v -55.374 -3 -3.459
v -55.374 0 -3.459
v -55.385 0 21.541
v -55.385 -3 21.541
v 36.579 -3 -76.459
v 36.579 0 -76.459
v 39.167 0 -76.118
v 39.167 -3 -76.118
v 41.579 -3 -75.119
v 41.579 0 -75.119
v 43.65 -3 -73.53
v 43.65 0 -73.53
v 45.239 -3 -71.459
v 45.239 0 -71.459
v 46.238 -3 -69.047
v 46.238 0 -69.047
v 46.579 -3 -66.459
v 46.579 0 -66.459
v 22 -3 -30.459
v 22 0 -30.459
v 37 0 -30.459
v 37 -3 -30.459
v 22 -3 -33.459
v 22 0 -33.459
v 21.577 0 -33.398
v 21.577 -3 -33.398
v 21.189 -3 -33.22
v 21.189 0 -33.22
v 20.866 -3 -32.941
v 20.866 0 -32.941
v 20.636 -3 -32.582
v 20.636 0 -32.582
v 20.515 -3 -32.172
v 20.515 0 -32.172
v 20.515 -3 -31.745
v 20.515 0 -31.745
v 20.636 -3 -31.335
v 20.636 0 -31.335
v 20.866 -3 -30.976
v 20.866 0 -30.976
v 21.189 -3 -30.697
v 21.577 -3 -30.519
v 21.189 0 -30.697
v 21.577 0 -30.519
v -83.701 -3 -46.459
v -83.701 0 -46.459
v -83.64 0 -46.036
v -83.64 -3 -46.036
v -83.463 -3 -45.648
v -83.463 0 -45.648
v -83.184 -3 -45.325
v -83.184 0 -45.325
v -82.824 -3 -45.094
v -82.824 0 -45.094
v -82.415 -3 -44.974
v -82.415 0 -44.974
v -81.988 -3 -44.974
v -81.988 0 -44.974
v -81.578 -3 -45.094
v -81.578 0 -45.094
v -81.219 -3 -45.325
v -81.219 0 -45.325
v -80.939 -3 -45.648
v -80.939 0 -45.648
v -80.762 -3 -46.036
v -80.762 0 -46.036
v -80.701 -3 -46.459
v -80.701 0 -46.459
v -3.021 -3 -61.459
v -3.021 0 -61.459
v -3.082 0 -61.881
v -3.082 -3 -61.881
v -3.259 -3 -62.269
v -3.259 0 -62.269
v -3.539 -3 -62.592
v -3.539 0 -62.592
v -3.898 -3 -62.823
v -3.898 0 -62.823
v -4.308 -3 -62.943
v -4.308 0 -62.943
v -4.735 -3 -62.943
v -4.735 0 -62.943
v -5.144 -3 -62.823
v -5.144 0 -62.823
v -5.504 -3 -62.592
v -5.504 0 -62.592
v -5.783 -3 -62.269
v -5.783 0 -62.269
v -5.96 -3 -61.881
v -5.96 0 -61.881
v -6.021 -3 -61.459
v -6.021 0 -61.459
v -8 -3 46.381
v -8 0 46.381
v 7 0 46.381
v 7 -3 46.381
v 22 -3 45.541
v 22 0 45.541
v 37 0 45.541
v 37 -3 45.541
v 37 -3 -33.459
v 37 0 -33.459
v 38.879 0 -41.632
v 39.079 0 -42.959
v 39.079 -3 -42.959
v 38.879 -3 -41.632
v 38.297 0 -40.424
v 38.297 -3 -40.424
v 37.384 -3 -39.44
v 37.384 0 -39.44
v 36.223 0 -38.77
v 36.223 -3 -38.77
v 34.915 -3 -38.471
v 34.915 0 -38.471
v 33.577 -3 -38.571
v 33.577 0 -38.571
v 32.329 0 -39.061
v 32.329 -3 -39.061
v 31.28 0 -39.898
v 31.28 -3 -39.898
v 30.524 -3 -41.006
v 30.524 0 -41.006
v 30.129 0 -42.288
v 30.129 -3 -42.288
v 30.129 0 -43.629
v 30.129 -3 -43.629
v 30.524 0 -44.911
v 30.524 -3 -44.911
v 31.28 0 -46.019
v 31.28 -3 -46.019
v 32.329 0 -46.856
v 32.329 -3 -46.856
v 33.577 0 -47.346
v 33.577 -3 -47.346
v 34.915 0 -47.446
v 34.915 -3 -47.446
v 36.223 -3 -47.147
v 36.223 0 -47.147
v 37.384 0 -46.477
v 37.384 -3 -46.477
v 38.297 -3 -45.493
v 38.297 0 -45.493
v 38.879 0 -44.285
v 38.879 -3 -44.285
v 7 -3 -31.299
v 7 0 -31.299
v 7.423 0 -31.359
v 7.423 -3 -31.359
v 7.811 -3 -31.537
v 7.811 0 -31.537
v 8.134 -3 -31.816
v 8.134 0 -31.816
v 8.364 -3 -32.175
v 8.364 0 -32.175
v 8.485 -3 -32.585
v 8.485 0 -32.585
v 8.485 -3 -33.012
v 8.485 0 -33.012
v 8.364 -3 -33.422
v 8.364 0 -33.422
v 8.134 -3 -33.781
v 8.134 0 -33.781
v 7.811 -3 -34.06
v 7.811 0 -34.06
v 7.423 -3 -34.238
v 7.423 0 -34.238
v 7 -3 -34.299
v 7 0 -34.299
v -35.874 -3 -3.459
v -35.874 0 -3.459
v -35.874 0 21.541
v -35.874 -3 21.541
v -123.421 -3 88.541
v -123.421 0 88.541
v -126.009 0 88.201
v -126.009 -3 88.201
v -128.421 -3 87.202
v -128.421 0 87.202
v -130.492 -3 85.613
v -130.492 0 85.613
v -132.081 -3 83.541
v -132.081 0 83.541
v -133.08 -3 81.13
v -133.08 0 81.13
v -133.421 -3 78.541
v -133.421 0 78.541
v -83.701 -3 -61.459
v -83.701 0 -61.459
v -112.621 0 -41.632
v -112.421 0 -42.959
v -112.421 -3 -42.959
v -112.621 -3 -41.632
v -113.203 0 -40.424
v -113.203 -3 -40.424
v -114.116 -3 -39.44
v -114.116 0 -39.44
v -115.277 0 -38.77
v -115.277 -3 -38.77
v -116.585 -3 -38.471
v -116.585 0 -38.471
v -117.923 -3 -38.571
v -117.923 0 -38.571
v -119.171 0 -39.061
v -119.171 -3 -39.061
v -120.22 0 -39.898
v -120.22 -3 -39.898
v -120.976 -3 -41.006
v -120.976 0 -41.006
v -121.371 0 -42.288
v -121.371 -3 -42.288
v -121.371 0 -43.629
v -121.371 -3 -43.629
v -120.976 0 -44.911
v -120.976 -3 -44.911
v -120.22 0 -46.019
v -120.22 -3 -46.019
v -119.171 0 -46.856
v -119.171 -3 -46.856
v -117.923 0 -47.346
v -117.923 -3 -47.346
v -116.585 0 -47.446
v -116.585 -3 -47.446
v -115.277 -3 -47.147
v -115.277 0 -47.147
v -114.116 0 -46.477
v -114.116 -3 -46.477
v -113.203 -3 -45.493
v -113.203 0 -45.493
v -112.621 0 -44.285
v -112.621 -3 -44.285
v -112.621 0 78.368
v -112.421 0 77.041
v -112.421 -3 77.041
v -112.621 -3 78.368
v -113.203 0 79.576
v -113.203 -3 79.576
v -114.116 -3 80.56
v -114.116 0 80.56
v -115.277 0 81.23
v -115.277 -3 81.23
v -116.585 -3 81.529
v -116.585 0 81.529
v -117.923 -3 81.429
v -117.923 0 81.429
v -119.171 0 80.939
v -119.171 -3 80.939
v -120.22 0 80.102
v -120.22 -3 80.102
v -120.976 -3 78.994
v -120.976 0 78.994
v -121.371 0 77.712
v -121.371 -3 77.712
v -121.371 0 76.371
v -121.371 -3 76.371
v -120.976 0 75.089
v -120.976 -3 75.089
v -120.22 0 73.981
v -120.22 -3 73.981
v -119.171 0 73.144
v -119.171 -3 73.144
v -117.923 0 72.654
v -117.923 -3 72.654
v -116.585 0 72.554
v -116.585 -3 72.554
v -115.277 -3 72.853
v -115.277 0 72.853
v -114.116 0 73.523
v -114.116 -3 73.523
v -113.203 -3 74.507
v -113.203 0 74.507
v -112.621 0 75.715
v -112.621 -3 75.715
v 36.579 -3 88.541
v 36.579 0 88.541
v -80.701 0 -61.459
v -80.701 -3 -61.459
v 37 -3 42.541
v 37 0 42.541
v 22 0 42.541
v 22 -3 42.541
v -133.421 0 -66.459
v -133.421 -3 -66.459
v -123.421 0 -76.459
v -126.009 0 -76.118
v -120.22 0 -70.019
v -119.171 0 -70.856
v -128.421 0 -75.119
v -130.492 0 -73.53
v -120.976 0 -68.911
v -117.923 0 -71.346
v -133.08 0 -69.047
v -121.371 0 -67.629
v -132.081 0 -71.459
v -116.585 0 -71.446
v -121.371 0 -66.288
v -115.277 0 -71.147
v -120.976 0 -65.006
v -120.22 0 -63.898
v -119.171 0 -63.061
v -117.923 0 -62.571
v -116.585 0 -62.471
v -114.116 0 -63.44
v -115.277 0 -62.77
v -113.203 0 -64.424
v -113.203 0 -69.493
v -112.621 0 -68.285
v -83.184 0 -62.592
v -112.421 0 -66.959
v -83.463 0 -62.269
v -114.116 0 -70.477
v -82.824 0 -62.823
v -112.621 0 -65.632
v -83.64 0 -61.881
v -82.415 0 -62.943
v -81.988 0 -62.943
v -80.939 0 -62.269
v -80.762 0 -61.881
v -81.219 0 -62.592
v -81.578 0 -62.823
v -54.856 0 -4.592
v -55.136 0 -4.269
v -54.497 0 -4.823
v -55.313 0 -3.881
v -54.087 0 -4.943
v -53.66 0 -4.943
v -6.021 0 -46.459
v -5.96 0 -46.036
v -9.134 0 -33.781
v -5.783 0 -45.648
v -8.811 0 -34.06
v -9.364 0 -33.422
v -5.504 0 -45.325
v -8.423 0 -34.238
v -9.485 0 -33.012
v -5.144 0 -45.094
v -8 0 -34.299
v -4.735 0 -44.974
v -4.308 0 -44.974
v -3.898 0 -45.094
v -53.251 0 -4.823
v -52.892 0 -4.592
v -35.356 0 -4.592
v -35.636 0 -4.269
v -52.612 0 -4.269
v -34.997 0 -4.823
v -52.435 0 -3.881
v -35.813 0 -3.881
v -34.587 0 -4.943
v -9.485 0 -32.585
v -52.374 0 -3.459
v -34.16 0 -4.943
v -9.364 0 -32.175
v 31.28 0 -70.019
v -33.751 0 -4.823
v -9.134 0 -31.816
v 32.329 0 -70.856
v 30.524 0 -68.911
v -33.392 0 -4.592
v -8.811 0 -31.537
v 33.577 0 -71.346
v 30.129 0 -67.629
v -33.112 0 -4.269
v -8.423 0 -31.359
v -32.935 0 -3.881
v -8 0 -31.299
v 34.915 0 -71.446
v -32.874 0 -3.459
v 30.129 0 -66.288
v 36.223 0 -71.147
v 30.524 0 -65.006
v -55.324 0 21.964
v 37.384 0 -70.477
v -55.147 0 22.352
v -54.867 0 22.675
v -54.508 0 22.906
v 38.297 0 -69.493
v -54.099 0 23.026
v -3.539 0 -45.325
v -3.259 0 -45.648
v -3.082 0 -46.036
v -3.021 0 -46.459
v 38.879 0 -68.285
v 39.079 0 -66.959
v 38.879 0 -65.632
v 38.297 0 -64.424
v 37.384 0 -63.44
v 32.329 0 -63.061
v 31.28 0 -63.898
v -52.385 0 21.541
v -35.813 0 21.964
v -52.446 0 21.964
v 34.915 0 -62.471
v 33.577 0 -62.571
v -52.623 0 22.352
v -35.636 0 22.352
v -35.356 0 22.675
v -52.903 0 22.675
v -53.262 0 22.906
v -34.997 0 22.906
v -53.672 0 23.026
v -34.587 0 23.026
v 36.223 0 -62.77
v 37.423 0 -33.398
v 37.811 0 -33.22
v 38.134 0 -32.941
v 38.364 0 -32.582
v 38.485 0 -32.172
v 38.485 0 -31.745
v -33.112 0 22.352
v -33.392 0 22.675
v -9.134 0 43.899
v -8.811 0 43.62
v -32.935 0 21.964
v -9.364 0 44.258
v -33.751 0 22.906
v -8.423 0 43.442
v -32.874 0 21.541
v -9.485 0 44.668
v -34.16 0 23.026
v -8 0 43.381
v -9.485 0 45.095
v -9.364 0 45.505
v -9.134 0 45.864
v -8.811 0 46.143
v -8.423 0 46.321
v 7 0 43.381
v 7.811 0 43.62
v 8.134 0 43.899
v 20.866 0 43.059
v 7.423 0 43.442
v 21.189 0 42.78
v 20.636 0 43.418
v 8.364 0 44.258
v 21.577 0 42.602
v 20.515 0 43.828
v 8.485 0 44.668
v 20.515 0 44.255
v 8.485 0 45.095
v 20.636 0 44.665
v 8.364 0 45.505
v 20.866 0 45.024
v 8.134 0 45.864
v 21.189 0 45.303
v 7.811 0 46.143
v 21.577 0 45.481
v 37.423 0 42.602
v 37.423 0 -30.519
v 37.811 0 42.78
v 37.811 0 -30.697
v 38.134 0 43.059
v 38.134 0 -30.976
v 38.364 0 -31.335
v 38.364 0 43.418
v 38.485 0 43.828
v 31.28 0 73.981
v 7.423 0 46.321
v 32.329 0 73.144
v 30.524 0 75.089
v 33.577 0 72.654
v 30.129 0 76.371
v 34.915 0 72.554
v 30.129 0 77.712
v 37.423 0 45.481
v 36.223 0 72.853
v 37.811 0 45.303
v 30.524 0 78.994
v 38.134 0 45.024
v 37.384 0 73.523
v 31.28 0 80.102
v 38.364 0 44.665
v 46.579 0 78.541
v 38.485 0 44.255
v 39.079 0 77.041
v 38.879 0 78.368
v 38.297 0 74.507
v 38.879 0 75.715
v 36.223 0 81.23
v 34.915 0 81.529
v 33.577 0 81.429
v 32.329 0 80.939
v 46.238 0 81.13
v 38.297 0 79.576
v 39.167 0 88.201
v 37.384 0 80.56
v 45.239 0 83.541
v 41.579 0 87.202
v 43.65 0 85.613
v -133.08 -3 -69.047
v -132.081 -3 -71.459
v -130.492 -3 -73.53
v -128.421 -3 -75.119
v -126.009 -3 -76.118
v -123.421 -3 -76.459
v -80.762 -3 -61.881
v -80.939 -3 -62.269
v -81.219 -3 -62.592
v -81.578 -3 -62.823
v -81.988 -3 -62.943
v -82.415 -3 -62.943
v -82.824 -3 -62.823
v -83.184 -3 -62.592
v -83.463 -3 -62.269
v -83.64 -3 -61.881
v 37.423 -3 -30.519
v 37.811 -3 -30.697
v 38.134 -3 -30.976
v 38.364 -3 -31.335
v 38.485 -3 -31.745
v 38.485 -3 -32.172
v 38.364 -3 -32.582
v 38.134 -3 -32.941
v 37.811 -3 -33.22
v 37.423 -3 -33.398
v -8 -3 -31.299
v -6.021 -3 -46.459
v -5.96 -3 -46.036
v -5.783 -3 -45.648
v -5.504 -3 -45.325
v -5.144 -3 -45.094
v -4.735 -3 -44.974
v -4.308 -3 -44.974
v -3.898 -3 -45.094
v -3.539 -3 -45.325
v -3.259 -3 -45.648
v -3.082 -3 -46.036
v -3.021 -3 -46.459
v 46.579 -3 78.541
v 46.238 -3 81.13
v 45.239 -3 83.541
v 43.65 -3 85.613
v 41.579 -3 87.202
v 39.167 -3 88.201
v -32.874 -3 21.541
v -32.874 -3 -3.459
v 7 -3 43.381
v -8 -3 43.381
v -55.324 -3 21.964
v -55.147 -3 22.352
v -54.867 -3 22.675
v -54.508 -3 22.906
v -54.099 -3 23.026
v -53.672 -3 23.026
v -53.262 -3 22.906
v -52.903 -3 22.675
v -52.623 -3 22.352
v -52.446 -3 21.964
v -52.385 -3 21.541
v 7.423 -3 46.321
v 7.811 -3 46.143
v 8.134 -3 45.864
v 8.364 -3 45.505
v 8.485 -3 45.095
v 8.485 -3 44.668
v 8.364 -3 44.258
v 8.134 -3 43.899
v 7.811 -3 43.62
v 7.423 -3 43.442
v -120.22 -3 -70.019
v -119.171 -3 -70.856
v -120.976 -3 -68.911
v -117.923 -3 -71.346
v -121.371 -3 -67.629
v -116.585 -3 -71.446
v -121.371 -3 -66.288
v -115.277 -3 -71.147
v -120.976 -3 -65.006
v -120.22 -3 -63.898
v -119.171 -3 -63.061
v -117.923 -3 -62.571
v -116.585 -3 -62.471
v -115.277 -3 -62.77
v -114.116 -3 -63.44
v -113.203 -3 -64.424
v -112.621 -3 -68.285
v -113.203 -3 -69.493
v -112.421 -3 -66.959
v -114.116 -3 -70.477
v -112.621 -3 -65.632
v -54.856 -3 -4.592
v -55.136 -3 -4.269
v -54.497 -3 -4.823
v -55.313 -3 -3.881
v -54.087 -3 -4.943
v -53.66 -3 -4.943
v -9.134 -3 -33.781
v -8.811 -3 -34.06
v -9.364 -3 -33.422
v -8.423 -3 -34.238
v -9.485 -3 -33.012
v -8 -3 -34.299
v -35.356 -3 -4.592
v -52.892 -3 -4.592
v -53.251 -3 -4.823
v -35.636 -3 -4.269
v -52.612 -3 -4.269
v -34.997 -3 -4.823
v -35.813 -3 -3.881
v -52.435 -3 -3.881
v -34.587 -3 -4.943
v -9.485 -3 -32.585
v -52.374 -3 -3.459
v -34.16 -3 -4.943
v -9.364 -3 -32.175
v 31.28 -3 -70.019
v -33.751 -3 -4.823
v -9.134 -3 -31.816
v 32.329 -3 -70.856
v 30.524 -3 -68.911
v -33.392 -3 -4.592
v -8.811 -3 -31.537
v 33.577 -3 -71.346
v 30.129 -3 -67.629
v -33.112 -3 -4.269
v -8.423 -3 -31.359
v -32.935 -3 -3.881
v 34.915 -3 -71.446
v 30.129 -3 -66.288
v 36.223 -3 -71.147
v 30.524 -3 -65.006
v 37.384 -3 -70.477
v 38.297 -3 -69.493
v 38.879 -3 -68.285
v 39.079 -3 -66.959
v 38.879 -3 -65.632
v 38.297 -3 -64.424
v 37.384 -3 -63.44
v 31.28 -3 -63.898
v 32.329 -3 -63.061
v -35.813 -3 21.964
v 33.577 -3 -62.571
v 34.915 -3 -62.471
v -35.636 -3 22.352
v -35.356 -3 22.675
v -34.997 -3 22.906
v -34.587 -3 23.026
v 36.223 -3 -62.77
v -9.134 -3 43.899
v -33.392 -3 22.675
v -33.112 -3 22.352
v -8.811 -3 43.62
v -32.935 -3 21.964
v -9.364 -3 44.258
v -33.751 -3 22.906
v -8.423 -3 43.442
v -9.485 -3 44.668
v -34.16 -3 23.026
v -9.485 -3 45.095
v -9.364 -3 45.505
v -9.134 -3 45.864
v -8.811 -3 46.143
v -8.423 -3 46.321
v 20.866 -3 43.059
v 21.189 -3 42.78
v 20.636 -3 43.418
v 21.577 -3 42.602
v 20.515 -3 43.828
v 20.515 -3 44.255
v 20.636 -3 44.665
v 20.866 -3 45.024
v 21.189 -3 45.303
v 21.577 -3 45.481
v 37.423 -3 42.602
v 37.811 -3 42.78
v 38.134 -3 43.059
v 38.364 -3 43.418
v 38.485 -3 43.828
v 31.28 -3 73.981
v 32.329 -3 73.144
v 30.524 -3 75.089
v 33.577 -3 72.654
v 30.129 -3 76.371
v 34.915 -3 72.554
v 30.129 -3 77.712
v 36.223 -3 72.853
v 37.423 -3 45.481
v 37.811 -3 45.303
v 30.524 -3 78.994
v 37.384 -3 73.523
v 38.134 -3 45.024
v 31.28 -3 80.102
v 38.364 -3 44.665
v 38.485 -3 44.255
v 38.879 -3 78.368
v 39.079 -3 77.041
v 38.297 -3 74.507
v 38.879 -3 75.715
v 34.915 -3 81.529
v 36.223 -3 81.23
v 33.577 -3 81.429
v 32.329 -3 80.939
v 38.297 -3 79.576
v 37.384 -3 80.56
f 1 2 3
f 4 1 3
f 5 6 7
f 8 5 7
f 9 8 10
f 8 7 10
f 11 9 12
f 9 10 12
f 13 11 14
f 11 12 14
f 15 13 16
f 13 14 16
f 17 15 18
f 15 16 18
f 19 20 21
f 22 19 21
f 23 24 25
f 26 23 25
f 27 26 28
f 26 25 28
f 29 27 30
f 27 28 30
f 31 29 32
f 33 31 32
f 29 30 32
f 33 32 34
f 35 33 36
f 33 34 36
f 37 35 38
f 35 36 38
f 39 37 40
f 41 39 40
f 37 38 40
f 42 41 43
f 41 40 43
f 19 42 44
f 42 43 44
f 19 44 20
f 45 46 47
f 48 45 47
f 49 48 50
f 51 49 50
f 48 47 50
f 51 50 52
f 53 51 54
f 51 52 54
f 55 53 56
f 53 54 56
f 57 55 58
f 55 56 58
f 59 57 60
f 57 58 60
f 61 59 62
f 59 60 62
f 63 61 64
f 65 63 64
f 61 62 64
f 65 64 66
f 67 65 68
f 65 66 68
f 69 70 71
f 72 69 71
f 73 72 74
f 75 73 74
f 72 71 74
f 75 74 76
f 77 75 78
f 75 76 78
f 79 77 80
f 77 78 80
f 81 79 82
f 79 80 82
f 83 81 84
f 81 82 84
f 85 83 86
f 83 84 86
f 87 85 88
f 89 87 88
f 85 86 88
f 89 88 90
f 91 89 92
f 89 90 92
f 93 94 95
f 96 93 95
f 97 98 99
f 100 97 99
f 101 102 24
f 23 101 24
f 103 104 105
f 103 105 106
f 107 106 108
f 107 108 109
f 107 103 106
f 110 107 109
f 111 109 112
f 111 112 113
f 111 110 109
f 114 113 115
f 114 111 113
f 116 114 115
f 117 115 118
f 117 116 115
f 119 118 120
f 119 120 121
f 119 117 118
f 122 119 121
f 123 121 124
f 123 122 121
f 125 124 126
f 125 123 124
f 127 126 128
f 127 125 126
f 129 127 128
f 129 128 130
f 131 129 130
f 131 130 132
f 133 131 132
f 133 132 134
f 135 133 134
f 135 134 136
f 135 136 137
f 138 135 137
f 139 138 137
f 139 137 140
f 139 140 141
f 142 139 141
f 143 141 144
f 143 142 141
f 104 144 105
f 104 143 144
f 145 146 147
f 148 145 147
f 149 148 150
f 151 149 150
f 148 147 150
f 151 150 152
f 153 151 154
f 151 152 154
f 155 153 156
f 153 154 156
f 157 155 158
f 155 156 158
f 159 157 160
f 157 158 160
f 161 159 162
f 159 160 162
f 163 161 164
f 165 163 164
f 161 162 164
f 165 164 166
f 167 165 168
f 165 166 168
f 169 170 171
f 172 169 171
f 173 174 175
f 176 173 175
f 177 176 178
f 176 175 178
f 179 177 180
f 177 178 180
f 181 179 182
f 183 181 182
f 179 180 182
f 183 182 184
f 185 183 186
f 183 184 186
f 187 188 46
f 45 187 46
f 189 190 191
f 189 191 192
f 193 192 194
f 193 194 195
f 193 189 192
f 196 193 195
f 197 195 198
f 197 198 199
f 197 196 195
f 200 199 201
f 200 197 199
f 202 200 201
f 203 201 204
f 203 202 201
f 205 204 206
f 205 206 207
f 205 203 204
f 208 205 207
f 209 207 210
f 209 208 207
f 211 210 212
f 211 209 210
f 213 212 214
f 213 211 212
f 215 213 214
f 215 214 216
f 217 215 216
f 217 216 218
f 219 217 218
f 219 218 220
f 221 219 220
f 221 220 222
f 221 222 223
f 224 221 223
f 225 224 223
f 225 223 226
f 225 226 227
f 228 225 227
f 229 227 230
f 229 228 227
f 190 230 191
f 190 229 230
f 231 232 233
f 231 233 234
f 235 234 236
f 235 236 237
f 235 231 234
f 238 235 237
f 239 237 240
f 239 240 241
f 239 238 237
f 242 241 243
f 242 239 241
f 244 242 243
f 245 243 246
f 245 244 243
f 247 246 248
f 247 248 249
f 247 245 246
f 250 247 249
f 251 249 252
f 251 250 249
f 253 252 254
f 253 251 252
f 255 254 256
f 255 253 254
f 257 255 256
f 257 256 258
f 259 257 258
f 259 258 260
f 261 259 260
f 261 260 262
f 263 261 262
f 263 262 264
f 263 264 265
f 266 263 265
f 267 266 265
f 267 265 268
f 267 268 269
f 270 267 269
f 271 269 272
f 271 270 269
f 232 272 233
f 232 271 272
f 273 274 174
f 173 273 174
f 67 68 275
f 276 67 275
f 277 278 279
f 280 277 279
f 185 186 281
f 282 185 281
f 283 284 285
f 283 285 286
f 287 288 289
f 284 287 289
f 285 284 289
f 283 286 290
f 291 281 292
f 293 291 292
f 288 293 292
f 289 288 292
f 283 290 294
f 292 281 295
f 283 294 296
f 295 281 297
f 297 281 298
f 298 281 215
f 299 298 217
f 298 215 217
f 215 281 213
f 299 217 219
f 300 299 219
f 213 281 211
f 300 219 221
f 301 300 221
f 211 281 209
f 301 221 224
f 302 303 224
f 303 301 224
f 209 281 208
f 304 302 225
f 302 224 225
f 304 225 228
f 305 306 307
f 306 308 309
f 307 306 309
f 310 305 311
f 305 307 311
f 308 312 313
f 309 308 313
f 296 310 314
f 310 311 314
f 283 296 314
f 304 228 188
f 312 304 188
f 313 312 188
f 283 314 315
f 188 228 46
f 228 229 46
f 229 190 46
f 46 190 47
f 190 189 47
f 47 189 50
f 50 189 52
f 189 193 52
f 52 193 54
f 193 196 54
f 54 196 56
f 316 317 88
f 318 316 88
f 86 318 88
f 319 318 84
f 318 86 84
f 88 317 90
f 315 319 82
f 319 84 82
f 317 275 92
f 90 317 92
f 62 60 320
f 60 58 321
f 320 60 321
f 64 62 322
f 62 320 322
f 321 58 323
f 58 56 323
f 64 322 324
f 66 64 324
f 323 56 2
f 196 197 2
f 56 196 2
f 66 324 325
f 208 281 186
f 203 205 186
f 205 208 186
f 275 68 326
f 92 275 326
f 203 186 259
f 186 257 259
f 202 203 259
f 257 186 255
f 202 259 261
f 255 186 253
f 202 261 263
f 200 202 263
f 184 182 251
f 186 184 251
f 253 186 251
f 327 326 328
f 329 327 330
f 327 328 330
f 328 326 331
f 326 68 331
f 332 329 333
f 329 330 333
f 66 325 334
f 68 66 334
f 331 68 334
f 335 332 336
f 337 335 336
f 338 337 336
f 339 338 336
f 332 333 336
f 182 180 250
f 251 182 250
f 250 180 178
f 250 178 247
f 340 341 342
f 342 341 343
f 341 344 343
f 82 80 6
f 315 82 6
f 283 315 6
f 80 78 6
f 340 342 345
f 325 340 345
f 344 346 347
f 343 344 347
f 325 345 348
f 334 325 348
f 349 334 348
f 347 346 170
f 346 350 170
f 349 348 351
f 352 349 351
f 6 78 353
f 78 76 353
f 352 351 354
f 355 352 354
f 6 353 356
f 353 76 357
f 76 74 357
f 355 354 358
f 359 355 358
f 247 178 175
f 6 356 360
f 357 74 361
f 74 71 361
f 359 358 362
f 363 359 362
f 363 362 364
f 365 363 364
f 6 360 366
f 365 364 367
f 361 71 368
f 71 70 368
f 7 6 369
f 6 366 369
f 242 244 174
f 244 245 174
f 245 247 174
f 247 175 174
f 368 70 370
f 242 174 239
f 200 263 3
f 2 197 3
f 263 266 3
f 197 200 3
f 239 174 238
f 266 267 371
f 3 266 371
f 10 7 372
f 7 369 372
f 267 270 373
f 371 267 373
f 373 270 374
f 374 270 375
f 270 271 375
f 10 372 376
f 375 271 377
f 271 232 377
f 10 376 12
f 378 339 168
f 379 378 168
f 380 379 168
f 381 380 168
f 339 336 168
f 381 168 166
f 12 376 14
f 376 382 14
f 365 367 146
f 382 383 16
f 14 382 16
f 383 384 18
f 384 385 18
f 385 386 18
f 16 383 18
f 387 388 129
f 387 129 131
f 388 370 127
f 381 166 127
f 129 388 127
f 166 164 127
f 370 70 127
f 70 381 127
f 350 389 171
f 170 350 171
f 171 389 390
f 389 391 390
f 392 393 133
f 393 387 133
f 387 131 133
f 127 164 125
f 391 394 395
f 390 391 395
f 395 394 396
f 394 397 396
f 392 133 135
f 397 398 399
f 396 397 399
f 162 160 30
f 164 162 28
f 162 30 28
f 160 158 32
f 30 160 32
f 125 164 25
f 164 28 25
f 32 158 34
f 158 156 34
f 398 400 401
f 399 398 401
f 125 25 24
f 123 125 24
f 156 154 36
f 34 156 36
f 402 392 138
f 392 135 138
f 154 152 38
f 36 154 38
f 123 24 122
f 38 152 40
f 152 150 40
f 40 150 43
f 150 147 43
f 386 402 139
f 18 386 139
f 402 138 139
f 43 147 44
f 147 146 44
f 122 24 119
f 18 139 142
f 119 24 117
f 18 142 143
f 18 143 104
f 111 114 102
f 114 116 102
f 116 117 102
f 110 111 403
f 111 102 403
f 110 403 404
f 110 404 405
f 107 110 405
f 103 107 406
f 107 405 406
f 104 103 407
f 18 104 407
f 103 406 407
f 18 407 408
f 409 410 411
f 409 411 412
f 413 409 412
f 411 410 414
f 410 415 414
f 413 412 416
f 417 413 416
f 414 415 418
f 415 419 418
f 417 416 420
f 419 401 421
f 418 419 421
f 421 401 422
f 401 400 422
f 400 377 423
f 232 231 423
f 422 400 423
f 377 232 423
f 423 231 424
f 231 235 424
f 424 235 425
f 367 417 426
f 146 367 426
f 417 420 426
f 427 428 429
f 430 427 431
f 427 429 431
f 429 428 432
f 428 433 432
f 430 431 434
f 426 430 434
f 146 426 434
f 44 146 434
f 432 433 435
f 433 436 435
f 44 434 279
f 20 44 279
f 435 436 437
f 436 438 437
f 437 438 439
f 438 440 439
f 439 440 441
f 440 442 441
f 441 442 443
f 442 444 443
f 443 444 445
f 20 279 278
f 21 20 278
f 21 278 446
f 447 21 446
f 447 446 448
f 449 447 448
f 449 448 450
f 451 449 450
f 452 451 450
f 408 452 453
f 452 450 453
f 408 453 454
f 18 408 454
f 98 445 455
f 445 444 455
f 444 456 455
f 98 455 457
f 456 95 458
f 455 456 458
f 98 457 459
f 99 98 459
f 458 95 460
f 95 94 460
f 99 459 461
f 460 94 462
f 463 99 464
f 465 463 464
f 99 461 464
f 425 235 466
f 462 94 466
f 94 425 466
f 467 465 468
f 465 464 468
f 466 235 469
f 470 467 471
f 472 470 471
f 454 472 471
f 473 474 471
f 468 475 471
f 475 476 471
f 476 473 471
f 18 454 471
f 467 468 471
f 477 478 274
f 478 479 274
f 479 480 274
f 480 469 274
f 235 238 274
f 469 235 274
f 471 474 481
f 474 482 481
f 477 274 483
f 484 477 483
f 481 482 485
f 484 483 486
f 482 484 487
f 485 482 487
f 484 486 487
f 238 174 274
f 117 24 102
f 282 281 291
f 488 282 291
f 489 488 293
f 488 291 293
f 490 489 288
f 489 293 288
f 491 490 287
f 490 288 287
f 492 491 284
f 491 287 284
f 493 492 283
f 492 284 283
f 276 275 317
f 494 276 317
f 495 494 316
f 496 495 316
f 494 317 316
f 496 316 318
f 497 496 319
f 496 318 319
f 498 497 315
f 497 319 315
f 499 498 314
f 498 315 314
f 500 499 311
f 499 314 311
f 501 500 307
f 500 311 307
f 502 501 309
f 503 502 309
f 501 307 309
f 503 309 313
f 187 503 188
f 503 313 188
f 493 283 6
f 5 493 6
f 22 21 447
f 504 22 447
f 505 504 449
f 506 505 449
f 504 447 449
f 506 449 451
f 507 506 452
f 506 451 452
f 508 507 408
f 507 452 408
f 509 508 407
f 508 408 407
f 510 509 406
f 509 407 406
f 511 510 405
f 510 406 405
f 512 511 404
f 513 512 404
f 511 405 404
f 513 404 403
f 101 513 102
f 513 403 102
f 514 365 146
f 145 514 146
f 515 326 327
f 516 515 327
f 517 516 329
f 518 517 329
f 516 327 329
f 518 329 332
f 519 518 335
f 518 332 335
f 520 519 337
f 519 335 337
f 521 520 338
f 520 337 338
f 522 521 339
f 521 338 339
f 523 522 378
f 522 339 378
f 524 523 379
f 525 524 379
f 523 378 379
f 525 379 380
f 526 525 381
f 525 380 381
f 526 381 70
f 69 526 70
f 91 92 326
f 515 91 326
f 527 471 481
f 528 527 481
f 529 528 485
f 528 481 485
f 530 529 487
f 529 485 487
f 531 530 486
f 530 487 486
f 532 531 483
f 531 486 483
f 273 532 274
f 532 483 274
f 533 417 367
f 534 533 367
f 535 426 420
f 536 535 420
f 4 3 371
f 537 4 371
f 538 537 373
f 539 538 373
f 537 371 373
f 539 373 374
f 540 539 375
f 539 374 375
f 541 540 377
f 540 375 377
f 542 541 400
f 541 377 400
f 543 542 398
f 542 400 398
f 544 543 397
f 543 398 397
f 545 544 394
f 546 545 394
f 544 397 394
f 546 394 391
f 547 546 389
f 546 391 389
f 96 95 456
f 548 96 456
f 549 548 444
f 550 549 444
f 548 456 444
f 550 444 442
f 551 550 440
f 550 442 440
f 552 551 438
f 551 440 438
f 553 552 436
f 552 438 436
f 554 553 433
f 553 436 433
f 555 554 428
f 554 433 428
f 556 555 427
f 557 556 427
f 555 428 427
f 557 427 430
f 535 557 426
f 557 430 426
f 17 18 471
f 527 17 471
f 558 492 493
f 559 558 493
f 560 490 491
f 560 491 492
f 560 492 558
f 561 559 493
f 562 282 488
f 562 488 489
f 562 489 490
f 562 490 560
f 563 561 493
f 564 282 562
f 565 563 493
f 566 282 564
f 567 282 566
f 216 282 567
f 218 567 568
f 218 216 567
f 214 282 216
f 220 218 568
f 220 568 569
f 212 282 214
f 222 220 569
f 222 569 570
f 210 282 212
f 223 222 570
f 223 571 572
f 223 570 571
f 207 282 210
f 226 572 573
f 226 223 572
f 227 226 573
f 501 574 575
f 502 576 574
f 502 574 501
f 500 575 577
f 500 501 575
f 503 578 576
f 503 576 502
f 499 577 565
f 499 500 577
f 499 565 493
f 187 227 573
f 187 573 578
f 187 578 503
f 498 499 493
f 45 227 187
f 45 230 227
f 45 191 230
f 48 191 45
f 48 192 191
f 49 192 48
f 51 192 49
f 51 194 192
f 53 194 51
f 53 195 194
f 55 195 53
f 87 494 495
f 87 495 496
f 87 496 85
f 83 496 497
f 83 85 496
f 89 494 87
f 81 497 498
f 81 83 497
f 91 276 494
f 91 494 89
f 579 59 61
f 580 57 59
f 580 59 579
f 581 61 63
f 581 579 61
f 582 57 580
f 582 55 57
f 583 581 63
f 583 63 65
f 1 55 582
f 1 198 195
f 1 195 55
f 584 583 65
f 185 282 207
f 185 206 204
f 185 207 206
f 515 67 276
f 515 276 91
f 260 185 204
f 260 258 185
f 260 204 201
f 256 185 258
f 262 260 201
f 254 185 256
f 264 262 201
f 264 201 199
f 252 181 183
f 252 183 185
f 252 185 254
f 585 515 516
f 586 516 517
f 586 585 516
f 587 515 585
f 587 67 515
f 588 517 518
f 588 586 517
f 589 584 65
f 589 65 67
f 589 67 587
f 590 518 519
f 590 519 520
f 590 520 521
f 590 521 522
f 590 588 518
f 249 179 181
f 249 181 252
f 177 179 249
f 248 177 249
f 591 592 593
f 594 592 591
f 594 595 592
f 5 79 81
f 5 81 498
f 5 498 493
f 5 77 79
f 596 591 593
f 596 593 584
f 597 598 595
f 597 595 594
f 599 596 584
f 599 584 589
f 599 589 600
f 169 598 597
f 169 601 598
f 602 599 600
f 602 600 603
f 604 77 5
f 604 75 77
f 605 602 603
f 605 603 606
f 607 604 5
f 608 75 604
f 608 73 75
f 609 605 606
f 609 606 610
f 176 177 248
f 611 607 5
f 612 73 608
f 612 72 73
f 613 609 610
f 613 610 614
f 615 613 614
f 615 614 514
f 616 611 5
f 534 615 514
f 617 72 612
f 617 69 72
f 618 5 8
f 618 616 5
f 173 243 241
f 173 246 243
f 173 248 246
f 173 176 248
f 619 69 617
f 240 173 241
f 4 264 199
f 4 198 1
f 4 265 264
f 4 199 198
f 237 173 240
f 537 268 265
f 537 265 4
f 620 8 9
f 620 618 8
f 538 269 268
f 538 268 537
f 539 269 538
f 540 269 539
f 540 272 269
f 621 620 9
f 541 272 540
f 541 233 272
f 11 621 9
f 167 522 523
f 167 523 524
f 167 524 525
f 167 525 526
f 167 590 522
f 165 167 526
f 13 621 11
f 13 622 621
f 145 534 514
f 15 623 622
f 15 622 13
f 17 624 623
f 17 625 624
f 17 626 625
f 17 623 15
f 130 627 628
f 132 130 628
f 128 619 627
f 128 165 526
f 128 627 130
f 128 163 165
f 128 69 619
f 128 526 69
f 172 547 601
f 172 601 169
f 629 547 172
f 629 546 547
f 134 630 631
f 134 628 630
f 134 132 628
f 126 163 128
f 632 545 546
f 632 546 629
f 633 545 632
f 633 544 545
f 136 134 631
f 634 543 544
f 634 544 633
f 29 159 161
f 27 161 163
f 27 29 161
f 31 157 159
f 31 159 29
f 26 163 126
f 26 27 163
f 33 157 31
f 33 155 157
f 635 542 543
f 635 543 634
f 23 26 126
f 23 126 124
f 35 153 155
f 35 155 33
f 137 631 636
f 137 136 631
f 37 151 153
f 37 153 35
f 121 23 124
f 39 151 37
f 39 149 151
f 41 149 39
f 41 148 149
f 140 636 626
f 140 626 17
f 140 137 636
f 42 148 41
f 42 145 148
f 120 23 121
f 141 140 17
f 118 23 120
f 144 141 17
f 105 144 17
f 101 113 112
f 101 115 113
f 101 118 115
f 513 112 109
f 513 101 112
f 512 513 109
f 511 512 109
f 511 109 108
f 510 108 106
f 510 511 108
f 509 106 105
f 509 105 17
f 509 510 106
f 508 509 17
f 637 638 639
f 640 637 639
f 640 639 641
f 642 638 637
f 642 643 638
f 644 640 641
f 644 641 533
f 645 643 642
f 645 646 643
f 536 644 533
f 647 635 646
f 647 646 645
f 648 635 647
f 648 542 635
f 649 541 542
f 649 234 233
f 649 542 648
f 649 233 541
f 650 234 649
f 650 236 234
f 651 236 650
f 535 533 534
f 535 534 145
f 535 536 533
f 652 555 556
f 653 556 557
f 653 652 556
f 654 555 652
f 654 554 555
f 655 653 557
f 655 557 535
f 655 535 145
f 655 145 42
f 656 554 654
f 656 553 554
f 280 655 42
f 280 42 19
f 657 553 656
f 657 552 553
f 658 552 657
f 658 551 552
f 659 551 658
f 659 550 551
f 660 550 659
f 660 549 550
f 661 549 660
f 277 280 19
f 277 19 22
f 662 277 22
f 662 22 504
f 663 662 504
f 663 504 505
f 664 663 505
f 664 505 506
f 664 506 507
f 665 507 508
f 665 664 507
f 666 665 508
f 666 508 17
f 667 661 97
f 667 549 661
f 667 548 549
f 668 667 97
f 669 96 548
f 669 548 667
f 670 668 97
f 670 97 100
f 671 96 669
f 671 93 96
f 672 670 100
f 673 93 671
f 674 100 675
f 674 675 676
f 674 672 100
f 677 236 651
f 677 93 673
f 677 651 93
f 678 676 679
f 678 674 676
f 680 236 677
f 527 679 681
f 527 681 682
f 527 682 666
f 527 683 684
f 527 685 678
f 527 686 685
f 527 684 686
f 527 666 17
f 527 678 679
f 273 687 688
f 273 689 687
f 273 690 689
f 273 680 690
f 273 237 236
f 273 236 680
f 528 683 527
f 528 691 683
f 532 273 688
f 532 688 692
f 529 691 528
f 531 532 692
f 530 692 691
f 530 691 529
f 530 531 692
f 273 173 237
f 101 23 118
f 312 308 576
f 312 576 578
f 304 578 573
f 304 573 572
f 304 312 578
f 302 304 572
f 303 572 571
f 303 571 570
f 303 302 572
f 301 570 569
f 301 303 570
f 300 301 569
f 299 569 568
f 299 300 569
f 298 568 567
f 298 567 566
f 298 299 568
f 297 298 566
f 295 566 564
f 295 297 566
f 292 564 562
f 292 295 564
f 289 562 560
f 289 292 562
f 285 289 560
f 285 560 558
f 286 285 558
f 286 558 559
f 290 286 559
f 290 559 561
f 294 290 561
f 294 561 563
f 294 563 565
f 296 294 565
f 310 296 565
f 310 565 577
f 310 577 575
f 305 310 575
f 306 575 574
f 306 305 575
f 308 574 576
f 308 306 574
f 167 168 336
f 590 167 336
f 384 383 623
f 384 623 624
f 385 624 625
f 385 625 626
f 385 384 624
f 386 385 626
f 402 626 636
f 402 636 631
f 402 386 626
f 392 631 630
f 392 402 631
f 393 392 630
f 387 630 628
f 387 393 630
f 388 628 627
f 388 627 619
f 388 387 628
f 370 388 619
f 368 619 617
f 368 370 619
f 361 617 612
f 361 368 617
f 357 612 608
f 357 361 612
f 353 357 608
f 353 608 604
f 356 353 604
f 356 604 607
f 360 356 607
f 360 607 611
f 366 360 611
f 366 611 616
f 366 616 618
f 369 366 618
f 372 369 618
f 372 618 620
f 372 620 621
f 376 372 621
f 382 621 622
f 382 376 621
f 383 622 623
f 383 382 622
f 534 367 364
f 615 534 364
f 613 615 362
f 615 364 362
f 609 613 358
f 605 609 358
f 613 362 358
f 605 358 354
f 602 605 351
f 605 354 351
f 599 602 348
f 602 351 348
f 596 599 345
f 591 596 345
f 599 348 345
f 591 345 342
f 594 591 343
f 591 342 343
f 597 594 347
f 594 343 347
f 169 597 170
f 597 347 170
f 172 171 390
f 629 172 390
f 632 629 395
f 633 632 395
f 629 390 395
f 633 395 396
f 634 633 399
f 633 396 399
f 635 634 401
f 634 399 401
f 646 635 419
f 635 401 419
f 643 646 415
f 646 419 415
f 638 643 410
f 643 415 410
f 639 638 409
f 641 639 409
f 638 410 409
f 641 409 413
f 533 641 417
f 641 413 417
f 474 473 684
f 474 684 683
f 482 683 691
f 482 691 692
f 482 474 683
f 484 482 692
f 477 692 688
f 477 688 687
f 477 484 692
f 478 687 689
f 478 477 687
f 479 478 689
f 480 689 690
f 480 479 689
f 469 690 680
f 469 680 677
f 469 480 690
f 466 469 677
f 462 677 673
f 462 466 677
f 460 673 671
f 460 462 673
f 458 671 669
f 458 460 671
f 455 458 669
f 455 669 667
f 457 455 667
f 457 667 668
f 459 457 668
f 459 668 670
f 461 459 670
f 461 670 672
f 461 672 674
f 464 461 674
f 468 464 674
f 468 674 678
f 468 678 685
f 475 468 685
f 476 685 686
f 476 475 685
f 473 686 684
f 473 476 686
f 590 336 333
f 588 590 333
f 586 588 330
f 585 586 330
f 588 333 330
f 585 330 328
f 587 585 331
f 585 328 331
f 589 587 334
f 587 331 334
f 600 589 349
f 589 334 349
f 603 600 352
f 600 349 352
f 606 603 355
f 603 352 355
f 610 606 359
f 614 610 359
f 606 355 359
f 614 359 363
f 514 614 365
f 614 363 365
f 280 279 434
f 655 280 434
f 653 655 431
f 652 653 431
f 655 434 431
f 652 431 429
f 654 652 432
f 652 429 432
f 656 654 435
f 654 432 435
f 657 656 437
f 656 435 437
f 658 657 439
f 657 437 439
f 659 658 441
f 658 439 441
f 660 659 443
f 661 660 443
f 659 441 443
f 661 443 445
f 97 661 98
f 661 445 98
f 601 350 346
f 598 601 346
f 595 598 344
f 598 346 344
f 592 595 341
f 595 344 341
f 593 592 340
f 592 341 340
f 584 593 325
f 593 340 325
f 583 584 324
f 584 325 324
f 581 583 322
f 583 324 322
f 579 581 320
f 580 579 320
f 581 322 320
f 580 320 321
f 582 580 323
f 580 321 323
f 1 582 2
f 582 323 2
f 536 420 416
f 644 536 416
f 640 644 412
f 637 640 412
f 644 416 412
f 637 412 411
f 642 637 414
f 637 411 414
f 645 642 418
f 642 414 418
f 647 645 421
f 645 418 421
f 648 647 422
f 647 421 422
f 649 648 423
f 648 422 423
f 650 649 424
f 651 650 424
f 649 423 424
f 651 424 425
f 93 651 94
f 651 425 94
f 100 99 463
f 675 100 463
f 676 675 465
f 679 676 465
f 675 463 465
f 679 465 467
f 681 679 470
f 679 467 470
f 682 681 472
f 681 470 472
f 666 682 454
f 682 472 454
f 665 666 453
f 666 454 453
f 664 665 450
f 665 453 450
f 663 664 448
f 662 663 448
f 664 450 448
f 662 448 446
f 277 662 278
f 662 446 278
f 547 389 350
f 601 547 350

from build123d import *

# Parameters (mm, degrees)
F0_R     = 4.5
F1_DEPTH = 3


# Not quite as in the source:
# - ends of sketch curves that miss each other by under 0.0002 mm in the source are joined


with BuildPart() as f1:
    # F0 (on Front) → F1 (new body)
    with BuildSketch(Plane.XZ):
        with BuildLine():
            ThreePointArc((-123.4212349358, 88.5414632024), (-130.4923027477, 85.6125310143), (-133.4212349358, 78.5414632024))
            Line((-133.4212349358, 78.5414632024), (-133.4212349358, -66.4585367976))
            ThreePointArc((-133.4212349358, -66.4585367976), (-130.4923027477, -73.5296046095), (-123.4212349358, -76.4585367976))
            Line((-123.4212349358, -76.4585367976), (36.5787650642, -76.4585367976))
            ThreePointArc((36.5787650642, -76.4585367976), (43.6498328761, -73.5296046095), (46.5787650642, -66.4585367976))
            Line((46.5787650642, -66.4585367976), (46.5787650642, 78.5414632024))
            ThreePointArc((46.5787650642, 78.5414632024), (43.6498328761, 85.6125310143), (36.5787650642, 88.5414632024))
            Line((36.5787650642, 88.5414632024), (-123.4212349358, 88.5414632024))
        make_face()
        with Locations((-116.9212349358, -66.9585367976)):
            Circle(F0_R, mode=Mode.SUBTRACT)
        with Locations((-116.9212349358, -42.9585367976)):
            Circle(F0_R, mode=Mode.SUBTRACT)
        with BuildLine():
            Line((-80.7012349358, -46.4585367976), (-80.7012349358, -61.4585367976))
            ThreePointArc((-80.7012349358, -61.4585367976), (-82.2012349358, -62.9585367976), (-83.7012349358, -61.4585367976))
            Line((-83.7012349358, -61.4585367976), (-83.7012349358, -46.4585367976))
            ThreePointArc((-83.7012349358, -46.4585367976), (-82.2012349358, -44.9585367976), (-80.7012349358, -46.4585367976))
        make_face(mode=Mode.SUBTRACT)
        with BuildLine():
            ThreePointArc((-3.0212349358, -61.4585367976), (-4.5212349358, -62.9585367976), (-6.0212349358, -61.4585367976))
            Line((-6.0212349358, -61.4585367976), (-6.0212349358, -46.4585367976))
            ThreePointArc((-6.0212349358, -46.4585367976), (-4.5212349358, -44.9585367976), (-3.0212349358, -46.4585367976))
            Line((-3.0212349358, -46.4585367976), (-3.0212349358, -61.4585367976))
        make_face(mode=Mode.SUBTRACT)
        with Locations((34.5787650642, -66.9585362183)):
            Circle(F0_R, mode=Mode.SUBTRACT)
        with Locations((34.5787650642, -42.9585362183)):
            Circle(F0_R, mode=Mode.SUBTRACT)
        with BuildLine():
            ThreePointArc((-8, -34.2985367976), (-9.5, -32.7985367976), (-8, -31.2985367976))
            Line((-8, -31.2985367976), (7, -31.2985367976))
            ThreePointArc((7, -31.2985367976), (8.5, -32.7985367976), (7, -34.2985367976))
            Line((7, -34.2985367976), (0, -34.2985367976))
            Line((0, -34.2985367976), (-8, -34.2985367976))
        make_face(mode=Mode.SUBTRACT)
        with BuildLine():
            ThreePointArc((22, -33.4585367976), (20.5, -31.9585367976), (22, -30.4585367976))
            Line((22, -30.4585367976), (37, -30.4585367976))
            ThreePointArc((37, -30.4585367976), (38.5, -31.9585367976), (37, -33.4585367976))
            Line((37, -33.4585367976), (22, -33.4585367976))
        make_face(mode=Mode.SUBTRACT)
        with BuildLine():
            ThreePointArc((-55.3851271454, 21.5414632024), (-53.8851271454, 23.0414632024), (-52.3851271454, 21.5414632024))
            Line((-52.3851271454, 21.5414632024), (-52.3738959134, -3.4585362183))
            ThreePointArc((-52.3738959134, -3.4585362183), (-53.8738959134, -4.9585367976), (-55.3738959134, -3.4585362183))
            Line((-55.3738959134, -3.4585362183), (-55.3851271454, 21.5414632024))
        make_face(mode=Mode.SUBTRACT)
        with Locations((-116.9212349358, 77.0414632024)):
            Circle(F0_R, mode=Mode.SUBTRACT)
        with BuildLine():
            ThreePointArc((-32.8738959134, -3.4585371545), (-34.3738959134, -4.9585367976), (-35.8738959134, -3.4585371545))
            Line((-35.8738959134, -3.4585371545), (-35.8738959134, 21.5414632024))
            ThreePointArc((-35.8738959134, 21.5414632024), (-34.3738959134, 23.0414632024), (-32.8738959134, 21.5414632024))
            Line((-32.8738959134, 21.5414632024), (-32.8738959134, -3.4585371545))
        make_face(mode=Mode.SUBTRACT)
        with BuildLine():
            Line((7, 43.3814632024), (-8, 43.3814632024))
            ThreePointArc((-8, 43.3814632024), (-9.5, 44.8814632024), (-8, 46.3814632024))
            Line((-8, 46.3814632024), (7, 46.3814632024))
            ThreePointArc((7, 46.3814632024), (8.5, 44.8814632024), (7, 43.3814632024))
        make_face(mode=Mode.SUBTRACT)
        with BuildLine():
            Line((22, 45.5414632024), (37, 45.5414632024))
            ThreePointArc((37, 45.5414632024), (38.5, 44.0414632024), (37, 42.5414632024))
            Line((37, 42.5414632024), (22, 42.5414632024))
            ThreePointArc((22, 42.5414632024), (20.5, 44.0414632024), (22, 45.5414632024))
        make_face(mode=Mode.SUBTRACT)
        with Locations((34.5787650642, 77.0414632024)):
            Circle(F0_R, mode=Mode.SUBTRACT)
    extrude(amount=F1_DEPTH)


solid = f1.part
